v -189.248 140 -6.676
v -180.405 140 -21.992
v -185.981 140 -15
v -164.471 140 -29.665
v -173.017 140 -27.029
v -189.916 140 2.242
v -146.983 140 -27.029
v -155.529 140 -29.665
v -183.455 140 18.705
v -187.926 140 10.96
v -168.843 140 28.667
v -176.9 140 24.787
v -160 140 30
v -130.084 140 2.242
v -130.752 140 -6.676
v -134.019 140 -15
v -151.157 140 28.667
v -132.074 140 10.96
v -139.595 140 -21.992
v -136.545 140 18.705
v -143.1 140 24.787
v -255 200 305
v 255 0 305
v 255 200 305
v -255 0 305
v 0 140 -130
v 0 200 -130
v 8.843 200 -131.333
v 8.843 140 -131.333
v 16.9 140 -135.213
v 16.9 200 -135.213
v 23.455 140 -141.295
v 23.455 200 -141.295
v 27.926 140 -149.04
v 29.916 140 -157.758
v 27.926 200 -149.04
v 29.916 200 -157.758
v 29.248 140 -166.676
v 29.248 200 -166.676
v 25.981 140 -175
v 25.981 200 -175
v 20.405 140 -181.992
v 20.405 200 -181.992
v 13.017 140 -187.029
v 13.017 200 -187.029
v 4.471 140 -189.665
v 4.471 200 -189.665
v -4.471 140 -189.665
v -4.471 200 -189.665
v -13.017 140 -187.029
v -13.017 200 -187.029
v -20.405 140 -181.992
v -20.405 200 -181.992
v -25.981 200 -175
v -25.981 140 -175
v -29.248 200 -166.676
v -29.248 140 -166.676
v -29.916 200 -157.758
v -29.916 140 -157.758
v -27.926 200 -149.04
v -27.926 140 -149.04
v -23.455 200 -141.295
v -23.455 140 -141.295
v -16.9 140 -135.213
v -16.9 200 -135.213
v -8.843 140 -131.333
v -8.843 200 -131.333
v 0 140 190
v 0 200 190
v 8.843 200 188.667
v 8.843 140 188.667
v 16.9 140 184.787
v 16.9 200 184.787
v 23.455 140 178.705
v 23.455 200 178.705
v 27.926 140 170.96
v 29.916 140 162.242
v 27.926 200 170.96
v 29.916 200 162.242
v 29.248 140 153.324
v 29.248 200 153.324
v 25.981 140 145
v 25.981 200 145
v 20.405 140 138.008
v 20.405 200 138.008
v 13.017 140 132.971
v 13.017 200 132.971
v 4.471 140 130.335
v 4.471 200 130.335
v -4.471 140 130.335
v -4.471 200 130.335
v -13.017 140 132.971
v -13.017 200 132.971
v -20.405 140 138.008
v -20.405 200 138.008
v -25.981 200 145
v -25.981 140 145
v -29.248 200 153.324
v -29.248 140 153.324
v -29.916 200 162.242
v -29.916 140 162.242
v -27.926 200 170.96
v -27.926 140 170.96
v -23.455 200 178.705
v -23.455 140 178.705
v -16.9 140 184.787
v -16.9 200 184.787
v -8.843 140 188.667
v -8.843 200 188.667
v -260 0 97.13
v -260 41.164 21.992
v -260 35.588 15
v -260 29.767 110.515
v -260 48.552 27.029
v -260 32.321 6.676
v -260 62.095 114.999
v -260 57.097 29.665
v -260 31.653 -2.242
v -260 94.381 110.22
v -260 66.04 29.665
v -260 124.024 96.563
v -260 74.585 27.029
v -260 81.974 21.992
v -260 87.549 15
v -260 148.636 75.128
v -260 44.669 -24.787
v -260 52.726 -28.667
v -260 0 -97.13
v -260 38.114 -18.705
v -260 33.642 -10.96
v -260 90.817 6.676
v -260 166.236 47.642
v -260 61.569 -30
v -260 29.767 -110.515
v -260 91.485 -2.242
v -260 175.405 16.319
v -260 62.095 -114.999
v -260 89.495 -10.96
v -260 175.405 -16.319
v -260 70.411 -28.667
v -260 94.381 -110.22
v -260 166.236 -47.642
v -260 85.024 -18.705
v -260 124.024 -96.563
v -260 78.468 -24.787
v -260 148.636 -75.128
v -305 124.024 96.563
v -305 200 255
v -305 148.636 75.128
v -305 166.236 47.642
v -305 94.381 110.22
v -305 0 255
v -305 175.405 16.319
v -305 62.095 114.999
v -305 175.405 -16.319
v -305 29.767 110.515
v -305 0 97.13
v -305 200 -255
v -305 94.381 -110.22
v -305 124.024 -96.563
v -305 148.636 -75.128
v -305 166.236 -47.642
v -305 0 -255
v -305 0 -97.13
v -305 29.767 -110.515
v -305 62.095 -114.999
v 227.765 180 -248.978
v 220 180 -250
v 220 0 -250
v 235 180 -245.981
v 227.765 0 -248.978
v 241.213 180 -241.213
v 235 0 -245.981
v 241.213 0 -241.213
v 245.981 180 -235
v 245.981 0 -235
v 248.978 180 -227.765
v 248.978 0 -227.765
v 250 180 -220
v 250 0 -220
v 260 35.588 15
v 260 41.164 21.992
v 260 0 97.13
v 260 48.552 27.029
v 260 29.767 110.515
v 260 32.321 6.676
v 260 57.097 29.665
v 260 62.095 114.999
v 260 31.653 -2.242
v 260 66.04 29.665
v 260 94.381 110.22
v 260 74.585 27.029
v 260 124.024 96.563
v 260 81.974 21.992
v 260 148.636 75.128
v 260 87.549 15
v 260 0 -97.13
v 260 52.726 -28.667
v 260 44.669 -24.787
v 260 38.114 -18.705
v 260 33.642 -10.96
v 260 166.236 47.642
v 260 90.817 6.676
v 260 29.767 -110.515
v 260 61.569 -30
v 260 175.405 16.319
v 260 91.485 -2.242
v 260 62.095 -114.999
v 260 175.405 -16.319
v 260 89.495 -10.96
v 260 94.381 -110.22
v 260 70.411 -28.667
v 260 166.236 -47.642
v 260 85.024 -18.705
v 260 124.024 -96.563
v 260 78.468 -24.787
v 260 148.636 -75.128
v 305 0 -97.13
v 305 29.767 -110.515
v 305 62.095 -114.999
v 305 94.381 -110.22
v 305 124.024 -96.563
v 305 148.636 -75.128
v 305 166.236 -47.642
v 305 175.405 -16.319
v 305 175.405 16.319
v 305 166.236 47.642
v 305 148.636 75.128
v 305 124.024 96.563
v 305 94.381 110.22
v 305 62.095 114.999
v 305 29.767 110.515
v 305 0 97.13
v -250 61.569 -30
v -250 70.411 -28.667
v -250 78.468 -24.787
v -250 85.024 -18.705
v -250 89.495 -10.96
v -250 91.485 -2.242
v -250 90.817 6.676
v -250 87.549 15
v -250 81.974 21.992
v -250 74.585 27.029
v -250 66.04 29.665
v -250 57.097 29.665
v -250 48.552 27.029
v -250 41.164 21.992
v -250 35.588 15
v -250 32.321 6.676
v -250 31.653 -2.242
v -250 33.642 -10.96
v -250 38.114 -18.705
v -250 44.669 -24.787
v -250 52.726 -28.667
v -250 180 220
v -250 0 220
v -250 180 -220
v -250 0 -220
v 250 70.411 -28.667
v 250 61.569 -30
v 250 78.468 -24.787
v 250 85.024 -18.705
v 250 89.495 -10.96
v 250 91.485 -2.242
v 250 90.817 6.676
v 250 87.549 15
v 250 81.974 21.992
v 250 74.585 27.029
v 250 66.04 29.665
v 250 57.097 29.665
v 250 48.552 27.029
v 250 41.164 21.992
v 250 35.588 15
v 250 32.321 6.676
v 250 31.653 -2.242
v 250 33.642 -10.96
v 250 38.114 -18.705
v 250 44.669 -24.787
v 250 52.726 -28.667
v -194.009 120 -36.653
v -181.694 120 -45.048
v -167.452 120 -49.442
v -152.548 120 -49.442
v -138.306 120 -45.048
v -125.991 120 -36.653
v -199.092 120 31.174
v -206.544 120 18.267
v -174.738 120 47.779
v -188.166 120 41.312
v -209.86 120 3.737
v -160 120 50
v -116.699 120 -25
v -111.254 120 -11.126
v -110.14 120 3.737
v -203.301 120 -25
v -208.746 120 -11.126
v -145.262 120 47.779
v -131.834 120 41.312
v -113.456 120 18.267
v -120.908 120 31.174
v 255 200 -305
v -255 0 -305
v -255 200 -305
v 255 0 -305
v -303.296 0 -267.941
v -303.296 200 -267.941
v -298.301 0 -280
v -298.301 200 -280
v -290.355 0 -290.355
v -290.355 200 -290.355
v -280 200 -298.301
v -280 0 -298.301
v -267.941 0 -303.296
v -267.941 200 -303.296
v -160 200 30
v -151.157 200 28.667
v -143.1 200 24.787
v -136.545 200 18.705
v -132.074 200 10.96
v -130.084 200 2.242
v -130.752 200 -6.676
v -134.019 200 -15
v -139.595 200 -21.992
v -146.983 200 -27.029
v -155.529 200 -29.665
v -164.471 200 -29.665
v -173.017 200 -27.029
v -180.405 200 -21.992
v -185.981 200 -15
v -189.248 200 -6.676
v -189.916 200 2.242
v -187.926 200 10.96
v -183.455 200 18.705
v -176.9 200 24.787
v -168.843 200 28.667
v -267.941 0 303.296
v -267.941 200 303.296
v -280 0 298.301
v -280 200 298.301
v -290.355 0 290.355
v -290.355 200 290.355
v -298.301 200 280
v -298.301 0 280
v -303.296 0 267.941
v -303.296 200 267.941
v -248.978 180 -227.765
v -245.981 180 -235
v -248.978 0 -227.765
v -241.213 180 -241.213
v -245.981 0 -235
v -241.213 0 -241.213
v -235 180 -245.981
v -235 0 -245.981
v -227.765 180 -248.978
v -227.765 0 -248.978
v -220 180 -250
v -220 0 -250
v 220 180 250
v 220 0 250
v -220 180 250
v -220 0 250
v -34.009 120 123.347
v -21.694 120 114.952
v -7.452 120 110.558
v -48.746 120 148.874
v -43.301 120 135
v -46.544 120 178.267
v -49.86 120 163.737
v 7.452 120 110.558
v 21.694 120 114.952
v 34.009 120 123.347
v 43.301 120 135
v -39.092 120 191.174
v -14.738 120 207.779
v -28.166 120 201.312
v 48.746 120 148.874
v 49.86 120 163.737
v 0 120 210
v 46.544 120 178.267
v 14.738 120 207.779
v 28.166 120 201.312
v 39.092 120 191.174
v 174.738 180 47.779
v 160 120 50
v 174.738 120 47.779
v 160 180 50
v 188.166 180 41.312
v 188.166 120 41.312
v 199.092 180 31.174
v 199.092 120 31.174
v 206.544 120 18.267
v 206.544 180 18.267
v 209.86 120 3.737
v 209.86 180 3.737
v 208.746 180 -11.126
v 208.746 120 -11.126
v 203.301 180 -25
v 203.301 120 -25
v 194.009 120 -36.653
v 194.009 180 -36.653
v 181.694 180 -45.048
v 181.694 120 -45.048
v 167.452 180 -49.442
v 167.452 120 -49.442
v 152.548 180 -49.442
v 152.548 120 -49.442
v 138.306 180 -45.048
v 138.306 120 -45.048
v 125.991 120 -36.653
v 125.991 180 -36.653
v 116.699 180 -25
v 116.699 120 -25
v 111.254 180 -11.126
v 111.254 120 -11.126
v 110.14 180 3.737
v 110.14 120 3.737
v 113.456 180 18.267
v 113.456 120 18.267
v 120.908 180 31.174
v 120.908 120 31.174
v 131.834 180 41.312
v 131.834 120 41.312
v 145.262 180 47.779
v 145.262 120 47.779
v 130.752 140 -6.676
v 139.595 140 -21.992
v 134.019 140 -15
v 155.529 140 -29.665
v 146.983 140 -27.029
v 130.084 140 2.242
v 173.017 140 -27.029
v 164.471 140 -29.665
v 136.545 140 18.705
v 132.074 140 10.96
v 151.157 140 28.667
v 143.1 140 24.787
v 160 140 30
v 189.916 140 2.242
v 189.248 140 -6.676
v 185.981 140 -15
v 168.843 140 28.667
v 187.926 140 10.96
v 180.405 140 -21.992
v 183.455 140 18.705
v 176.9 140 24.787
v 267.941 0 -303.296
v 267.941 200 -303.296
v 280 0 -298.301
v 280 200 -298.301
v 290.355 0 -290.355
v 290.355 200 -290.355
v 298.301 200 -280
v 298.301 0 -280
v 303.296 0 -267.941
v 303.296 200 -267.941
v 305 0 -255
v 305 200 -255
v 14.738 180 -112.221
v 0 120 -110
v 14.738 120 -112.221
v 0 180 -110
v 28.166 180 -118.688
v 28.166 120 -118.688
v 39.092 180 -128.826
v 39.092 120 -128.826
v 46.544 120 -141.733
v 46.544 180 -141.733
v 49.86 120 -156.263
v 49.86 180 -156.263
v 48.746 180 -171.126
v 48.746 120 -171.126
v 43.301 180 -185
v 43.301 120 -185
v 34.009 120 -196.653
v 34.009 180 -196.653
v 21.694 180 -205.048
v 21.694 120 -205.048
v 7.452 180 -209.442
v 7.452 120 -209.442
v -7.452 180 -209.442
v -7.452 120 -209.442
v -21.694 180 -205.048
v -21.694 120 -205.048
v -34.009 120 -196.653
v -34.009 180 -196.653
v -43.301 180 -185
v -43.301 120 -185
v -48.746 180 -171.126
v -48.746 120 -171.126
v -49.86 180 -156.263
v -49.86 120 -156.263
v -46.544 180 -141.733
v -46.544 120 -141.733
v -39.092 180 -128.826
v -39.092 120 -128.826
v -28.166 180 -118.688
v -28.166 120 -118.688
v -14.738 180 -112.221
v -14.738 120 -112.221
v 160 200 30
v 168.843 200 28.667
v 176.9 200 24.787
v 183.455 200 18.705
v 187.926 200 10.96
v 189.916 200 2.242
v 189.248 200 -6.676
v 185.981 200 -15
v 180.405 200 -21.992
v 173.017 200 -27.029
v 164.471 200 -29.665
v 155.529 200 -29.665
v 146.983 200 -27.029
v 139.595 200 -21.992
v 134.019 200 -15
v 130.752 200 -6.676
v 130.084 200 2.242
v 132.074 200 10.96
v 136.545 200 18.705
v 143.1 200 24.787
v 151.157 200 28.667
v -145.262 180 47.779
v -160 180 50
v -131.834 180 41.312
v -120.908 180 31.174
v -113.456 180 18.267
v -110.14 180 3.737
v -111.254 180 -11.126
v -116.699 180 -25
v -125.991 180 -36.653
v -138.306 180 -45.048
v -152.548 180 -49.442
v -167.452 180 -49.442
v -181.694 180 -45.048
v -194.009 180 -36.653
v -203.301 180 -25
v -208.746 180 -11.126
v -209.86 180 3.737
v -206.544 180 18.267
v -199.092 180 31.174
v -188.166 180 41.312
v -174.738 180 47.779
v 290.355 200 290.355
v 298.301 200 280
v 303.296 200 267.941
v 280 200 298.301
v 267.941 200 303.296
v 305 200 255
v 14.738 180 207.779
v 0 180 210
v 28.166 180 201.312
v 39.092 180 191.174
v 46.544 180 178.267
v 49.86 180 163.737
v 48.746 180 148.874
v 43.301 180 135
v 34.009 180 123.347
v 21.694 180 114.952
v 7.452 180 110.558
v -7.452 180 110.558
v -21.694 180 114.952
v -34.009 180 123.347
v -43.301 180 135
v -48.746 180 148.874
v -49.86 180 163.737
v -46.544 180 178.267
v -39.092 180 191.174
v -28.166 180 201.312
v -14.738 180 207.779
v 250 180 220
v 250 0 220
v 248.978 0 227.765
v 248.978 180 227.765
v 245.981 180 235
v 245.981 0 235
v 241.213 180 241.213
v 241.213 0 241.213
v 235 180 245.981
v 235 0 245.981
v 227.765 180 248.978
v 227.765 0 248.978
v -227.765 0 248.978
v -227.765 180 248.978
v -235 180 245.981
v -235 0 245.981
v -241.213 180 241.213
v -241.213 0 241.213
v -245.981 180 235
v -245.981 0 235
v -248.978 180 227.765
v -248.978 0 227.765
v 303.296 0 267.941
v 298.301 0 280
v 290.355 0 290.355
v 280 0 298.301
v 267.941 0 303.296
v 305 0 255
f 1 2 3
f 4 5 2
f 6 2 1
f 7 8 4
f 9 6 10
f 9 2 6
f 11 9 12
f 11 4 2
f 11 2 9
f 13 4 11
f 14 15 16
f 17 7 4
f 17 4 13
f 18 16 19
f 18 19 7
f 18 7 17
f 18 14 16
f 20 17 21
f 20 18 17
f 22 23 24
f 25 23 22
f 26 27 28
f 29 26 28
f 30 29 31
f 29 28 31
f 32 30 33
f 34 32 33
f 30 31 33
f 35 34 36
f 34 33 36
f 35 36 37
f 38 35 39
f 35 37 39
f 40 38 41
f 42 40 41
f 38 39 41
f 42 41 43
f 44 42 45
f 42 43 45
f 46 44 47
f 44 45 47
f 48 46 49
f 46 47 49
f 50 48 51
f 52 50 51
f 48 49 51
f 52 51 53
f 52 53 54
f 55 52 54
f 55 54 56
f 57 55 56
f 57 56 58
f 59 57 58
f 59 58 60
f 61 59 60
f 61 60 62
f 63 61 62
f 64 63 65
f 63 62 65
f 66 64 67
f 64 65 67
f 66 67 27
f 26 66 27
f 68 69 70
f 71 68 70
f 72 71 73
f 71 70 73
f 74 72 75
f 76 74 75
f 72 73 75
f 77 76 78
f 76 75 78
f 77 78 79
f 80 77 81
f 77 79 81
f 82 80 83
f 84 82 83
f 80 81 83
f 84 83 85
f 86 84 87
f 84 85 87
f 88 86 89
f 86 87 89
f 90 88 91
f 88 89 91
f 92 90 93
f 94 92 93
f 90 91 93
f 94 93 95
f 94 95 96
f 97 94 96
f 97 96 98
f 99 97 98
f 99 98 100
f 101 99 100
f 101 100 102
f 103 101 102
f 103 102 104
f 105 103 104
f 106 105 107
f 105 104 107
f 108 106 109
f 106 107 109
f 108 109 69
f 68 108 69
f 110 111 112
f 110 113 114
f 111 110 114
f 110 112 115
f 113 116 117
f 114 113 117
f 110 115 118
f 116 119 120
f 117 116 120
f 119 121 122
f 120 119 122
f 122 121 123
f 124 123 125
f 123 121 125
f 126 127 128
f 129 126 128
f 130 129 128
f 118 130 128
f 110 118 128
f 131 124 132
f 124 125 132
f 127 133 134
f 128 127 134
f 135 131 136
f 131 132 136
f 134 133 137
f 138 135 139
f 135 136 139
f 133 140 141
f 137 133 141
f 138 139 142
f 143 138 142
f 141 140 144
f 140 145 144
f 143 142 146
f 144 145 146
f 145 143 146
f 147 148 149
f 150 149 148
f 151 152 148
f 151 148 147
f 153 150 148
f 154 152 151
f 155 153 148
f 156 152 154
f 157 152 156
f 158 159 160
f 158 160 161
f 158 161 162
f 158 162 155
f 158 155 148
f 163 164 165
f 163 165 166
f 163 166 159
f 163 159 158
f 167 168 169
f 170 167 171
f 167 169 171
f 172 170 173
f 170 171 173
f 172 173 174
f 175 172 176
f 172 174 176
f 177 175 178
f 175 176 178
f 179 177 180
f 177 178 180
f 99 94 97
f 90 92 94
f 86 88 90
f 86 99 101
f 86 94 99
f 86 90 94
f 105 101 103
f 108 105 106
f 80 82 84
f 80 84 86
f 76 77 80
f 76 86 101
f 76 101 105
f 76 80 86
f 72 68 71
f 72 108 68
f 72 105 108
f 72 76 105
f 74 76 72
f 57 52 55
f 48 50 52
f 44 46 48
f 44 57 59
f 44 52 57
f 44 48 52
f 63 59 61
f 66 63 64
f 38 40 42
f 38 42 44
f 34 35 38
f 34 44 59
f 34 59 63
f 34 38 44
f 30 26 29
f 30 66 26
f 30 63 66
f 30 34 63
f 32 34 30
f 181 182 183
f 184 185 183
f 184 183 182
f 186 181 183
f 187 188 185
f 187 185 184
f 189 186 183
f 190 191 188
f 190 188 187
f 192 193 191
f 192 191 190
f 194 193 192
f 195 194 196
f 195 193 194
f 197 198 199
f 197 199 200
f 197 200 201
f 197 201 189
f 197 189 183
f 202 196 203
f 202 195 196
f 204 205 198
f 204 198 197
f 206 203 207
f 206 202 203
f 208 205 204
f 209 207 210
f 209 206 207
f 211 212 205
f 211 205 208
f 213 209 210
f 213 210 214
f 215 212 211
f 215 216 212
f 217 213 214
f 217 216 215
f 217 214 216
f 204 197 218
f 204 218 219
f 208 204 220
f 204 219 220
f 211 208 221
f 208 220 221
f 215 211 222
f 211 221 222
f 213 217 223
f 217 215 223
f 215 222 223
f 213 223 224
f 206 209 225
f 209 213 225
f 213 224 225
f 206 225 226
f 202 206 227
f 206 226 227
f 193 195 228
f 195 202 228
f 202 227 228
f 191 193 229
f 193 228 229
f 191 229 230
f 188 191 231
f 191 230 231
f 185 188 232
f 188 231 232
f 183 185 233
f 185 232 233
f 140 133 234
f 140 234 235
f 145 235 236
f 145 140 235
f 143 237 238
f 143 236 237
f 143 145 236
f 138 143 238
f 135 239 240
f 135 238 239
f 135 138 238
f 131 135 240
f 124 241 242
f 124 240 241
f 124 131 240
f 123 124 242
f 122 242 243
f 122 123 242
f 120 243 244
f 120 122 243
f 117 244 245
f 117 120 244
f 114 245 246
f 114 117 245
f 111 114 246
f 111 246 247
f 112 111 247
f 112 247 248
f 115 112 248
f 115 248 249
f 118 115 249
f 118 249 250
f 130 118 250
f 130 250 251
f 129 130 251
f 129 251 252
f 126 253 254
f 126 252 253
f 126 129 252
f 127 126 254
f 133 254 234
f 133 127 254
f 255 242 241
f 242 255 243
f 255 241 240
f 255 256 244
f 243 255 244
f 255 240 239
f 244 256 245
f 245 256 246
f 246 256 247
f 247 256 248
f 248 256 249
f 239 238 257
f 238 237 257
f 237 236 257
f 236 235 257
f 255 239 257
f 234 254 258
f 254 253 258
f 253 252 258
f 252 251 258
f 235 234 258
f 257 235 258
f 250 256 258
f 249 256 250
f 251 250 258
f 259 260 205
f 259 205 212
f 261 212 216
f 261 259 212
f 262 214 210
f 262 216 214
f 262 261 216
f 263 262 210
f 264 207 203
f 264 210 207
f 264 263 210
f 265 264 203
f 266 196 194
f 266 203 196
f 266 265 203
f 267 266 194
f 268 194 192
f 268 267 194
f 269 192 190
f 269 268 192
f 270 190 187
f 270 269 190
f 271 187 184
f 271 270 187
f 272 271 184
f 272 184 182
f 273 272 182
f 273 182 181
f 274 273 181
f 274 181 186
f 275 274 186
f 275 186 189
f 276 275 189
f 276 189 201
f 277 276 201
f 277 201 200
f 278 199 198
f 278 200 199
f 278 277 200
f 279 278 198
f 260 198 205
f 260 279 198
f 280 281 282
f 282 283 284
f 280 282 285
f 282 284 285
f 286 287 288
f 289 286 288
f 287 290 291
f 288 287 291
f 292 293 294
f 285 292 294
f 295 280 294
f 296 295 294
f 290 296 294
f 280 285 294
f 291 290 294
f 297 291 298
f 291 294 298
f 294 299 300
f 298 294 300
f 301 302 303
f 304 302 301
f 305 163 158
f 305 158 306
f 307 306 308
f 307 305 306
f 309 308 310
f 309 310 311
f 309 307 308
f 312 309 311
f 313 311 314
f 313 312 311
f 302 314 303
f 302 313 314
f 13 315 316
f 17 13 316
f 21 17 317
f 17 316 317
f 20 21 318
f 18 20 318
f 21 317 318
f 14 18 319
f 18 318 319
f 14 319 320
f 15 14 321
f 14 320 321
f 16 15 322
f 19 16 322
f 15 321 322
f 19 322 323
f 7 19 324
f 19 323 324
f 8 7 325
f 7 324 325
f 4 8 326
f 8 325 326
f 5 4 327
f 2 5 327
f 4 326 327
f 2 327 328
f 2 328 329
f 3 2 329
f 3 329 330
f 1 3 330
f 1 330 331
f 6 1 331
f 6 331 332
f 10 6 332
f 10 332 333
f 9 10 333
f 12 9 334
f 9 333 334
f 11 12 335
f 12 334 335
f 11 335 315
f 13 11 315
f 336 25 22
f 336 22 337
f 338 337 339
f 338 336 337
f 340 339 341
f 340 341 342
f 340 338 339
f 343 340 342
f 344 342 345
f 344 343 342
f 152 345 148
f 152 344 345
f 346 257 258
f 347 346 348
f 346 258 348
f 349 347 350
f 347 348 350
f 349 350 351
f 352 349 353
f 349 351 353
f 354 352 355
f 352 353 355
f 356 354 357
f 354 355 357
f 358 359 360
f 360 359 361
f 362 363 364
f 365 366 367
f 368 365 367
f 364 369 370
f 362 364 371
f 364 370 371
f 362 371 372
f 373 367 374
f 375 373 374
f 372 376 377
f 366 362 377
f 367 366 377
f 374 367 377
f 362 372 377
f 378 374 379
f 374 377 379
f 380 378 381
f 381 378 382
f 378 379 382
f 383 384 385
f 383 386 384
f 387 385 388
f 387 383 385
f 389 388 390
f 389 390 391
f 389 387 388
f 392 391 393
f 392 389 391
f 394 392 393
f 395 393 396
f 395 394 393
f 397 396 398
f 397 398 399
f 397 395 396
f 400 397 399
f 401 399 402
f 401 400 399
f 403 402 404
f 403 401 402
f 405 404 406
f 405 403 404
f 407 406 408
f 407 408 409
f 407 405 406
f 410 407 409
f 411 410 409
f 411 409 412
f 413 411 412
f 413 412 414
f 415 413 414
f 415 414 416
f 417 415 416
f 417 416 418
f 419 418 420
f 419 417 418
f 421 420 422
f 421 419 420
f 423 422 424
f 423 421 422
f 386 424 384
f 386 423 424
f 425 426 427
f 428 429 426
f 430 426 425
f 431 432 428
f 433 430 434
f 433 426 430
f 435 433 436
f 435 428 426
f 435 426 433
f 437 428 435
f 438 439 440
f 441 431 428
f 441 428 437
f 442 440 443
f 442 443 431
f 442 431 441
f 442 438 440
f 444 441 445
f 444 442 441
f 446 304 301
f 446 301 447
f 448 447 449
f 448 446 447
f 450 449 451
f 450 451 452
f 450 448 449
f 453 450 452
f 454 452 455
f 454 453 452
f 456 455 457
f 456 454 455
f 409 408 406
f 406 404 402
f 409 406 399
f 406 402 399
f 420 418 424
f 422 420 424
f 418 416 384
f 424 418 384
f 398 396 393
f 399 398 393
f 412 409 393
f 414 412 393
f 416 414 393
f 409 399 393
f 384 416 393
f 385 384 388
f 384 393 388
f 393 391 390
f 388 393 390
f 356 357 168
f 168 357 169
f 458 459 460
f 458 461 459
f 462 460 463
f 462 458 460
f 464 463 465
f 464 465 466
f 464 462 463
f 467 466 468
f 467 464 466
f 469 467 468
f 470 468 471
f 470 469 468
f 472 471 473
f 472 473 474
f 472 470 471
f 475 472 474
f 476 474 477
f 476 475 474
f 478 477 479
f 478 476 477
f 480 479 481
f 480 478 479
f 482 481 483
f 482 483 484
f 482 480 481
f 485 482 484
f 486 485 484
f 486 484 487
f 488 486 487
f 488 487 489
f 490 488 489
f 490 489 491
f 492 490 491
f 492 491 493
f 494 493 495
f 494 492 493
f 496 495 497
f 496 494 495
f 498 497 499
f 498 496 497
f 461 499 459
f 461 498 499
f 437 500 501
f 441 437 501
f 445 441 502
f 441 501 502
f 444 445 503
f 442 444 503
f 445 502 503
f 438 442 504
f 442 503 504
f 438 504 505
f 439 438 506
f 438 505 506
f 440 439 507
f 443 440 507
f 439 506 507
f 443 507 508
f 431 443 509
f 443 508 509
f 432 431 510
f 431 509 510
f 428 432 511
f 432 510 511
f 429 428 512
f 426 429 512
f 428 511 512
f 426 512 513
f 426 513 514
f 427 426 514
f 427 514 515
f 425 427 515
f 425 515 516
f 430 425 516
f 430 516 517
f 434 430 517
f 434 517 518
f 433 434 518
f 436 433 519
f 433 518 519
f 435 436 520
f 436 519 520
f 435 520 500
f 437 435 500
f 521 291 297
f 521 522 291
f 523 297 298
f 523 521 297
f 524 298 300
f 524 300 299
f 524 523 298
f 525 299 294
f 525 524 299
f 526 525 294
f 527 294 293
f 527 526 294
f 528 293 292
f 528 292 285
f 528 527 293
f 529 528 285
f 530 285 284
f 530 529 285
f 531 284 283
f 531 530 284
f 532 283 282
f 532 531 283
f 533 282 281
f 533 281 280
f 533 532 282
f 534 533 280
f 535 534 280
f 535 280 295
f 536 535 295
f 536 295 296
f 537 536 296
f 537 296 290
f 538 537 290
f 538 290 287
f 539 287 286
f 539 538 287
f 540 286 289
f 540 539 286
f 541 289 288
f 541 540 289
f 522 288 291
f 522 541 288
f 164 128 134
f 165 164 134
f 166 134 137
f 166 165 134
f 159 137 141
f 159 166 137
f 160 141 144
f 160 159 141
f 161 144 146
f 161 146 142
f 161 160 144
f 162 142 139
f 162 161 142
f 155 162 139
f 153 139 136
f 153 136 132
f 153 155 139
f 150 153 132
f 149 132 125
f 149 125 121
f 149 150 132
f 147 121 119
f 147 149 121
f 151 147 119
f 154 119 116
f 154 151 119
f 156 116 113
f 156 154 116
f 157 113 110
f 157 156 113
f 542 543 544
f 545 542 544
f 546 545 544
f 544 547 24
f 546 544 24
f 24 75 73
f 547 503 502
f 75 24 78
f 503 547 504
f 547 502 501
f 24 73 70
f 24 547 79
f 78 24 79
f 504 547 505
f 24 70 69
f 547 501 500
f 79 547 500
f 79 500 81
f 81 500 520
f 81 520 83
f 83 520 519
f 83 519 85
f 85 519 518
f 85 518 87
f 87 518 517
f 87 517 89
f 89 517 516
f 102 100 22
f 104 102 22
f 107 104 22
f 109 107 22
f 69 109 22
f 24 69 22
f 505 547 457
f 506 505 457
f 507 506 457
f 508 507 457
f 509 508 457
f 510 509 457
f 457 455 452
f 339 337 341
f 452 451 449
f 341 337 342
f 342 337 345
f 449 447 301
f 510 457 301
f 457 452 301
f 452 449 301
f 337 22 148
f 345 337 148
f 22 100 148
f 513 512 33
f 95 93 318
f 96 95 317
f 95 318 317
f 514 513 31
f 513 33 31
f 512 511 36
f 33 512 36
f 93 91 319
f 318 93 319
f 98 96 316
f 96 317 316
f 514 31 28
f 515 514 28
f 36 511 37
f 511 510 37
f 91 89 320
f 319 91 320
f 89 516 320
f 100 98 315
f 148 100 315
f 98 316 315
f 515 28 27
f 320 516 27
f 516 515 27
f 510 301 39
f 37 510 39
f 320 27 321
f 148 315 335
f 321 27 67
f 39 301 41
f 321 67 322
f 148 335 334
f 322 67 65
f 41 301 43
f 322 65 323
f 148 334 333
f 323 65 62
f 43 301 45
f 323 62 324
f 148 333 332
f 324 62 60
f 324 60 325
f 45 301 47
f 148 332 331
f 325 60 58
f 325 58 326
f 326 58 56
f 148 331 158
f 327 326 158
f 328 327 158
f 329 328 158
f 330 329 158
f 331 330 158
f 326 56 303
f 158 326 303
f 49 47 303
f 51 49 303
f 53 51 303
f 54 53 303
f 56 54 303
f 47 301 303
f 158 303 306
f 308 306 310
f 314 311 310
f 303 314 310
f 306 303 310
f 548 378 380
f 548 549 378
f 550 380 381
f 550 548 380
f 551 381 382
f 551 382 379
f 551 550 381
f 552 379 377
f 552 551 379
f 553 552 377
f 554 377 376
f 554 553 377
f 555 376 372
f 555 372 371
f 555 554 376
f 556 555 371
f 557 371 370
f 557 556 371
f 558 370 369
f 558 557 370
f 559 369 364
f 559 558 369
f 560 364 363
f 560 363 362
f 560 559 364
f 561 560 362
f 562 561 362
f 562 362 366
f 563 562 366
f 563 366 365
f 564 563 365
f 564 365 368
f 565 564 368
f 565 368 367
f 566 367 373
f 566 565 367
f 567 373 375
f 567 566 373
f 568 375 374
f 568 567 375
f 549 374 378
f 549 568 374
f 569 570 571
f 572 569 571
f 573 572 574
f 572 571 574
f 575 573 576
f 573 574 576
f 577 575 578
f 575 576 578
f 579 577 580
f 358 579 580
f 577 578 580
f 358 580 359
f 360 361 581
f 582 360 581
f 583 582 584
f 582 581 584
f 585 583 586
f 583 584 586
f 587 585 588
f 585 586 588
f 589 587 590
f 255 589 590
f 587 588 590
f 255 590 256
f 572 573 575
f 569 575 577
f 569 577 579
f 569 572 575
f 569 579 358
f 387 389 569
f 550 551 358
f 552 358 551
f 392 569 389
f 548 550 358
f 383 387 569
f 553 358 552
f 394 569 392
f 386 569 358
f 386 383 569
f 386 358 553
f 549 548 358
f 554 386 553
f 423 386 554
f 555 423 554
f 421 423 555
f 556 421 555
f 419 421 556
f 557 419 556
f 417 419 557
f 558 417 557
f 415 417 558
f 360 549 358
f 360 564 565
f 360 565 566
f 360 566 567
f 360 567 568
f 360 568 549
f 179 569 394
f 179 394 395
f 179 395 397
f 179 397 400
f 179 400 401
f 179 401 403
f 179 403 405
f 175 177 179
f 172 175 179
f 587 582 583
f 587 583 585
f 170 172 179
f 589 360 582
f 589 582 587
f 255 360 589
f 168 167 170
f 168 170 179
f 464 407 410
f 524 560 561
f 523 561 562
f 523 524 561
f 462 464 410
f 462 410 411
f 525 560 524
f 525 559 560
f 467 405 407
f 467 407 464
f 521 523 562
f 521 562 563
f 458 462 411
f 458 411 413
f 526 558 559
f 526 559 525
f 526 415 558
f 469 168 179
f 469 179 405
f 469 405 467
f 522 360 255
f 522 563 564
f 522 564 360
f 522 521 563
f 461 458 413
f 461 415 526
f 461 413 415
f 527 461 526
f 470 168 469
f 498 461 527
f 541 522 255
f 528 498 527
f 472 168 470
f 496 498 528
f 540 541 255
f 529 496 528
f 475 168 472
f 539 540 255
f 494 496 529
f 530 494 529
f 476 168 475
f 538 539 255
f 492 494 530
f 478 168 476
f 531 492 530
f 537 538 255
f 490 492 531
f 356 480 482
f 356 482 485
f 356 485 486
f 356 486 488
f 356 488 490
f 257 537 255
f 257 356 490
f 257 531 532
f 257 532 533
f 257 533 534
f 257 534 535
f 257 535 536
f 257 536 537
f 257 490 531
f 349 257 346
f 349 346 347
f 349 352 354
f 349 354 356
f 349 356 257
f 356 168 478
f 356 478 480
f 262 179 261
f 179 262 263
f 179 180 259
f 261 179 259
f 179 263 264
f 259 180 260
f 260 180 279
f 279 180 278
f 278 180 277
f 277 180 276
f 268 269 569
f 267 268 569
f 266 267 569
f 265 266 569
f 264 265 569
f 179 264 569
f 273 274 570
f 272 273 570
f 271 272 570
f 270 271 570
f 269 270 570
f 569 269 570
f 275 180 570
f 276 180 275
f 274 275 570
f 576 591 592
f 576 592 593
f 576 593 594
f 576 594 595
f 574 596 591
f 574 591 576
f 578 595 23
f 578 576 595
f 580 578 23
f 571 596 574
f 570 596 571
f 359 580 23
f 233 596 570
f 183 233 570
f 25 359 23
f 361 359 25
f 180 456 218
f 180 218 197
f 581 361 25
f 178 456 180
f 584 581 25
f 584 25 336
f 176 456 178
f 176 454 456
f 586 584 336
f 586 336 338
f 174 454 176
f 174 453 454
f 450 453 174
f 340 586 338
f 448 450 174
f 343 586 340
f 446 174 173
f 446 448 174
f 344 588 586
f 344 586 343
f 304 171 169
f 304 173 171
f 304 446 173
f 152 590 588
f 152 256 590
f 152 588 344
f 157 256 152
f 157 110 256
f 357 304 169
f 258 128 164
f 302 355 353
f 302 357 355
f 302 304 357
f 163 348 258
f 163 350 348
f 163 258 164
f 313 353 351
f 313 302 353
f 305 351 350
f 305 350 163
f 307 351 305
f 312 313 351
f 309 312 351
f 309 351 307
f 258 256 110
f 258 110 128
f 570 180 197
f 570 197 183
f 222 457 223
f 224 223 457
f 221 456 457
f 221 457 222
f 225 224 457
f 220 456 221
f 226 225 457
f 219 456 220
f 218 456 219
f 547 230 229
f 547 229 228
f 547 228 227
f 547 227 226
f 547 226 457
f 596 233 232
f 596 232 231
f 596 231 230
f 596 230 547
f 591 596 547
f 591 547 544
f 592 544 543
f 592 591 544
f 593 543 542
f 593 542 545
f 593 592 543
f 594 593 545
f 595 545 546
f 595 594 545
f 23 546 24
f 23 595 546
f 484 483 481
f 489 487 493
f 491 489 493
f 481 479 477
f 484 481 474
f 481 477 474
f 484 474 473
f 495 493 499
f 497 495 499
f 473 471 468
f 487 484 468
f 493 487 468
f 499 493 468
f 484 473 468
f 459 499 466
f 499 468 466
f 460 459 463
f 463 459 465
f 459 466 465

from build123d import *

# Parameters (mm, degrees)
BOSS_EXTRUDE1_DEPTH     = 200
SKETCH4_R               = 30
CUT_EXTRUDE1_DEPTH      = 60
SHELL1_T                = -20
BOSS_EXTRUDE2_DEPTH     = 200
SKETCH6_R               = 115
CUT_EXTRUDE3_DEPTH      = 50
CUT_EXTRUDE4_DEPTH      = 716.017482304
CUT_EXTRUDE4_DEPTH_BACK = 716.017482304
SKETCH7_R               = 30


with BuildPart() as part:
    # Sketch1 → Boss-Extrude1 (new body)
    with BuildSketch(Plane(origin=(0, 0, 0), x_dir=(1, 0, 0), z_dir=(0, 1, 0))):
        with BuildLine():
            Line((-220, 270), (220, 270))
            ThreePointArc((220, 270), (255.355339059, 255.355339059), (270, 220))
            Line((270, 220), (270, -220))
            ThreePointArc((270, -220), (255.355339059, -255.355339059), (220, -270))
            Line((220, -270), (-220, -270))
            ThreePointArc((-220, -270), (-255.355339059, -255.355339059), (-270, -220))
            Line((-270, -220), (-270, 220))
            ThreePointArc((-270, 220), (-255.355339059, 255.355339059), (-220, 270))
        make_face()
    extrude(amount=BOSS_EXTRUDE1_DEPTH)

    # Sketch4 → Cut-Extrude1 (cut)
    with BuildSketch(Plane(origin=(0, 200, 0), x_dir=(1, 0, 0), z_dir=(0, 1, 0))):
        with Locations(Location((0, 160, 0), (0, 0, 270))):
            Circle(SKETCH4_R)
        with Locations(Location((160, 0, 0), (0, 0, 270))):
            Circle(SKETCH4_R)
        with Locations(Location((0, -160, 0), (0, 0, 270))):
            Circle(SKETCH4_R)
        with Locations(Location((-160, 0, 0), (0, 0, 270))):
            Circle(SKETCH4_R)
    extrude(amount=-CUT_EXTRUDE1_DEPTH, mode=Mode.SUBTRACT)

    # Shell1
    shell1_openings = [part.faces().sort_by_distance(p)[0] for p in [
        (0, 0, 0),
    ]]
    offset(amount=SHELL1_T, openings=shell1_openings, kind=Kind.INTERSECTION)

    # Sketch5 → Boss-Extrude2 (add)
    with BuildSketch(Plane(origin=(0, 0, 0), x_dir=(1, 0, 0), z_dir=(0, 1, 0))):
        with BuildLine():
            Line((-255, 305), (255, 305))
            ThreePointArc((255, 305), (290.355339059, 290.355339059), (305, 255))
            Line((305, 255), (305, -255))
            ThreePointArc((305, -255), (290.355339059, -290.355339059), (255, -305))
            Line((255, -305), (-255, -305))
            ThreePointArc((-255, -305), (-290.355339059, -290.355339059), (-305, -255))
            Line((-305, -255), (-305, 255))
            ThreePointArc((-305, 255), (-290.355339059, 290.355339059), (-255, 305))
        make_face()
        with BuildLine():
            Line((-220, 270), (220, 270))
            ThreePointArc((220, 270), (255.355339059, 255.355339059), (270, 220))
            Line((270, 220), (270, -220))
            ThreePointArc((270, -220), (255.355339059, -255.355339059), (220, -270))
            Line((220, -270), (-220, -270))
            ThreePointArc((-220, -270), (-255.355339059, -255.355339059), (-270, -220))
            Line((-270, -220), (-270, 220))
            ThreePointArc((-270, 220), (-255.355339059, 255.355339059), (-220, 270))
        make_face(mode=Mode.SUBTRACT)
    extrude(amount=BOSS_EXTRUDE2_DEPTH)

    # Sketch6 → Cut-Extrude3 (cut)
    with BuildSketch(Plane(origin=(310, 0, 0), x_dir=(0, 0, -1), z_dir=(1, 0, 0))):
        with Locations((0, 61.568690233)):
            Circle(SKETCH6_R)
    cut_extrude3 = extrude(amount=-CUT_EXTRUDE3_DEPTH, mode=Mode.SUBTRACT)

    # Sketch7 → Cut-Extrude4 (cut, two sides: drawn at the far end of the back side and taken through both)
    with BuildSketch(Plane(origin=(310, 0, 0), x_dir=(0, 0, -1), z_dir=(1, 0, 0)).offset(-CUT_EXTRUDE4_DEPTH_BACK)):
        with Locations((0, 61.568690233)):
            Circle(SKETCH7_R)
    extrude(amount=CUT_EXTRUDE4_DEPTH + CUT_EXTRUDE4_DEPTH_BACK, mode=Mode.SUBTRACT)

    # Mirror1: Cut-Extrude3 across plane
    add(cut_extrude3.mirror(Plane(origin=(0, 0, 0), x_dir=(0, 0, 1), z_dir=(1, 0, 0))), mode=Mode.SUBTRACT)


solid = part.part
